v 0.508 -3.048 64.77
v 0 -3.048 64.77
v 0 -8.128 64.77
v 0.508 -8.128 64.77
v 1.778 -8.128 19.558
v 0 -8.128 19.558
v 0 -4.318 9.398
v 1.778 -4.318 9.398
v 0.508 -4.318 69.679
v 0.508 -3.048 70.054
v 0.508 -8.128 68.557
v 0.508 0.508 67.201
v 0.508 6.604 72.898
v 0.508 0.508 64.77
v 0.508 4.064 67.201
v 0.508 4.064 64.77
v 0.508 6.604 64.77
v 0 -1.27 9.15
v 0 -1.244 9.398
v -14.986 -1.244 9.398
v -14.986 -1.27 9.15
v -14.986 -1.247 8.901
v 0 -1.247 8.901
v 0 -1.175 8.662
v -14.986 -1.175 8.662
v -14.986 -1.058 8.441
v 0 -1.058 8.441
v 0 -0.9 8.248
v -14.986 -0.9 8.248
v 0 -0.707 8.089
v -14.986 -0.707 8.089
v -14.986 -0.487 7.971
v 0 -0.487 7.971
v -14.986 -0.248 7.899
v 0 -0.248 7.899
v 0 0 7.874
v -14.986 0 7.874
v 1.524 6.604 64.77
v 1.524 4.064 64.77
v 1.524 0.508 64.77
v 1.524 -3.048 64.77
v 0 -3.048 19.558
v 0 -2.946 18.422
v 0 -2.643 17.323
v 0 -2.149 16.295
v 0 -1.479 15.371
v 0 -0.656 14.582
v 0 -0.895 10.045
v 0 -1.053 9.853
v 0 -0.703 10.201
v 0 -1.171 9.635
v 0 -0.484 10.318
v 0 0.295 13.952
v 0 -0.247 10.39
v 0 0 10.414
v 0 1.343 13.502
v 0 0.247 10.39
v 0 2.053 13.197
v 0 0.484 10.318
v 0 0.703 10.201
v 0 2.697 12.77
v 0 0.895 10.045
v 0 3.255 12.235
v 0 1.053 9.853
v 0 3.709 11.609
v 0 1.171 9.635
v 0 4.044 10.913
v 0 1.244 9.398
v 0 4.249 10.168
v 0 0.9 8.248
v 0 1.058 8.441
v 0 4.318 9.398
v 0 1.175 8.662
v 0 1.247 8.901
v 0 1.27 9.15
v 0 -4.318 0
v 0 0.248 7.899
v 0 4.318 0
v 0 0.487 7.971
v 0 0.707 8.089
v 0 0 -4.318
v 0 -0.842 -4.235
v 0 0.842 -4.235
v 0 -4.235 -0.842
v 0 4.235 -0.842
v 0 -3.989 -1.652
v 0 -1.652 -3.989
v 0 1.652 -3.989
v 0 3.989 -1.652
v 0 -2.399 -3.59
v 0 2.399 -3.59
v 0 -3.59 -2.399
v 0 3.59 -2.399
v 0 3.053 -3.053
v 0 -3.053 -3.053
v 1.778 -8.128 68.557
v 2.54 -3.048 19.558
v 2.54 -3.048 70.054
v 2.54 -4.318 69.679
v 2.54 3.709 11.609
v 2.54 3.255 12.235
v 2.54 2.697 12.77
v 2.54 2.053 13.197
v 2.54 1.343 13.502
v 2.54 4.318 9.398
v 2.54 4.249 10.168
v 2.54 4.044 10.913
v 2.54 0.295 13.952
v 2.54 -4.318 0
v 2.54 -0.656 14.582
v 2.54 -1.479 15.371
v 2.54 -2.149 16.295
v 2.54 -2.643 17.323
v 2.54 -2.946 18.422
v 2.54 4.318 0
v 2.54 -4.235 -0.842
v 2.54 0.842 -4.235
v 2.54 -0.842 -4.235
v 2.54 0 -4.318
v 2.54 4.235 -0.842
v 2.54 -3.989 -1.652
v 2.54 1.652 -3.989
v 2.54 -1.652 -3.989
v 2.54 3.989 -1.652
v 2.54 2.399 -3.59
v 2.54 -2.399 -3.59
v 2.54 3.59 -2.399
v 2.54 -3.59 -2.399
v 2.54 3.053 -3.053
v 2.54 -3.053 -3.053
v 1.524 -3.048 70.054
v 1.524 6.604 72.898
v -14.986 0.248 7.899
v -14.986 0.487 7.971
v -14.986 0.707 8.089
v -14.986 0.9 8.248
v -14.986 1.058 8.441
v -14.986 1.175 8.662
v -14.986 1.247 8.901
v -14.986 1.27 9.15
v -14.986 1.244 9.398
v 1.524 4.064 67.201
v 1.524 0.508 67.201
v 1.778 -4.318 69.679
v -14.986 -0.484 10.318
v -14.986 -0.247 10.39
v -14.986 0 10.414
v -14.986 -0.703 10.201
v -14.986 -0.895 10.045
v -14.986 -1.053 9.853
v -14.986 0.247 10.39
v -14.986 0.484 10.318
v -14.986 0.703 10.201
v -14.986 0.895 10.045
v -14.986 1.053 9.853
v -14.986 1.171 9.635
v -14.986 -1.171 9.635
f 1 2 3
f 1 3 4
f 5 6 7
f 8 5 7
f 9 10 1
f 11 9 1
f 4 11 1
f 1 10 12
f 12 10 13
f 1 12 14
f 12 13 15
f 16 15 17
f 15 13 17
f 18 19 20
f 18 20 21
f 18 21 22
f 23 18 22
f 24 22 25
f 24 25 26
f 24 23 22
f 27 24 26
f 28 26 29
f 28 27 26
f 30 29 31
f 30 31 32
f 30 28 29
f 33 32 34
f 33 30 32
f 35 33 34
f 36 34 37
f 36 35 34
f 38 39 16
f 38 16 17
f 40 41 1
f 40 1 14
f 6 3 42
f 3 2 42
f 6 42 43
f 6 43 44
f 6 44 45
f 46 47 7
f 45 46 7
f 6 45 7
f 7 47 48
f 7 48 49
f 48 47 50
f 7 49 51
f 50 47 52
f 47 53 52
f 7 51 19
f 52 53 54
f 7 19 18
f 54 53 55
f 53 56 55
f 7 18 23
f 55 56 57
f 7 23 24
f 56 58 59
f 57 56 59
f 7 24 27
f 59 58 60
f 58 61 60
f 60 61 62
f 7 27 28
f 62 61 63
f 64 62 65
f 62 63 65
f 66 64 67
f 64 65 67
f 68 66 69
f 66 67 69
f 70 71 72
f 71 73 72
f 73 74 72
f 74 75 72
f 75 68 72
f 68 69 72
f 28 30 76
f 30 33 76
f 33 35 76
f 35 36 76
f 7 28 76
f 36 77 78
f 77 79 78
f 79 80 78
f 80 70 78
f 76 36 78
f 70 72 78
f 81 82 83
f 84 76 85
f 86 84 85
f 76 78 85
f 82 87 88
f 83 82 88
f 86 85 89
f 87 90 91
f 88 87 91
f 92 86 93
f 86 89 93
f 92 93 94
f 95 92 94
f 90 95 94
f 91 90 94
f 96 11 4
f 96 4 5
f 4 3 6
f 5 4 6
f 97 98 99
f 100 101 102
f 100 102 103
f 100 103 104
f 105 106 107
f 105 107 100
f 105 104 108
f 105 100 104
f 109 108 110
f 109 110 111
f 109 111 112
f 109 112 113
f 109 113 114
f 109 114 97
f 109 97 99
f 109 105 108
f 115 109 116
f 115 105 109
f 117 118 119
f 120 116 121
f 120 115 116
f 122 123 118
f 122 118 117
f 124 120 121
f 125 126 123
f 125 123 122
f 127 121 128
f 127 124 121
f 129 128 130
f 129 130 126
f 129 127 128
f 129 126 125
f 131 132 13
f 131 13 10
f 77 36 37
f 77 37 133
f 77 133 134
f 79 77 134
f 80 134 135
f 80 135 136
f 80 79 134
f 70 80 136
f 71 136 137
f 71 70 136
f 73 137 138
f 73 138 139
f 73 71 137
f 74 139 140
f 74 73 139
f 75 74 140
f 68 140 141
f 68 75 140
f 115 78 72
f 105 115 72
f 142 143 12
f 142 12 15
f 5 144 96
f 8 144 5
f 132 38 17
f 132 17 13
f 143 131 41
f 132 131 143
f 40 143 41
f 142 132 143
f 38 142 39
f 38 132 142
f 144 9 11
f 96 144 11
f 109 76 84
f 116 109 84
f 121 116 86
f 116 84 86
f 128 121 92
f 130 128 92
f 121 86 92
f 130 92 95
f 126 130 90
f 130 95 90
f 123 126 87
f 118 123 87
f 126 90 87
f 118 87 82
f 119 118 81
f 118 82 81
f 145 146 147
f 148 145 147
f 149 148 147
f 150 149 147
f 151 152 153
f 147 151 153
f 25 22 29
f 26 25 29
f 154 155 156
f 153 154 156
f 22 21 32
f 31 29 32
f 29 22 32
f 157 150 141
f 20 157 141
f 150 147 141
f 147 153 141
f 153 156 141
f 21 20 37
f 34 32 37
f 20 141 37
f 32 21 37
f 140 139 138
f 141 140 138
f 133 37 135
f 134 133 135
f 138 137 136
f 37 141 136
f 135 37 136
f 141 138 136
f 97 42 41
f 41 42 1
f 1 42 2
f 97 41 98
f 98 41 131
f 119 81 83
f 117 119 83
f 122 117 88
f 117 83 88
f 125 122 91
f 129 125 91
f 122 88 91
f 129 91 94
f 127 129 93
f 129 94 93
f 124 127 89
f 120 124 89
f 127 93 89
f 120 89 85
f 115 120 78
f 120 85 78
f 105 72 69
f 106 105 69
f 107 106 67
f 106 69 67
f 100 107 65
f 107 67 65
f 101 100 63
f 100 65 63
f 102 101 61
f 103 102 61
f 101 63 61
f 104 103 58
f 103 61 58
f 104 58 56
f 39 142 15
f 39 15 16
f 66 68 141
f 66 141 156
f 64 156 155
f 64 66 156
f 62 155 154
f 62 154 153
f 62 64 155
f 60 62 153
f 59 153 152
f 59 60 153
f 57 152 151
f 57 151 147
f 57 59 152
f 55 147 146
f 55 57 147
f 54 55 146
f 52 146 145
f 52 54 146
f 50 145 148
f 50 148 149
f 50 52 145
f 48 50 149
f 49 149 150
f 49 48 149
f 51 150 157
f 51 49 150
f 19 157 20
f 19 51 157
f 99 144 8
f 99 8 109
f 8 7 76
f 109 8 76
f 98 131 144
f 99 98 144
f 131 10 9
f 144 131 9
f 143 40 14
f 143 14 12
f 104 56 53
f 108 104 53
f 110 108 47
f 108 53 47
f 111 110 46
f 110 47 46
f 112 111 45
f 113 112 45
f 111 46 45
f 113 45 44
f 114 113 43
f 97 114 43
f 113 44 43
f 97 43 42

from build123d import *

# Parameters (mm, degrees)
BOSS_EXTRUDE2_DEPTH = 2.54
BOSS_EXTRUDE3_DEPTH = 1.778
BOSS_EXTRUDE4_START = 1.524
BOSS_EXTRUDE4_DEPTH = 1.27
SKETCH1_8_R         = 1.27
BOSS_EXTRUDE5_DEPTH = 14.986
SKETCH2_W           = 0.508
SKETCH2_H           = 8.128
CUT_EXTRUDE1_DEPTH  = 76.866530328


with BuildPart() as part:
    # Sketch1 → Boss-Extrude2 (new body)
    with BuildSketch(Plane(origin=(0, 0, 0), x_dir=(0, 0, -1), z_dir=(1, 0, 0))):
        with BuildLine():
            Line((0, 4.318), (-9.398, 4.318))
            ThreePointArc((-9.398, 4.318), (-11.932525974, 3.495897895), (-13.501957395, 1.342630889))
            ThreePointArc((-13.501957395, 1.342630889), (-15.817903355, -1.834857441), (-19.558, -3.048))
            Line((-19.558, -3.048), (-70.05358602, -3.048))
            Line((-70.05358602, -3.048), (-69.679321023, -4.318))
            Line((-69.679321023, -4.318), (0, -4.318))
            ThreePointArc((0, -4.318), (4.318, 0), (0, 4.318))
        make_face()
    extrude(amount=BOSS_EXTRUDE2_DEPTH)

    # Sketch1<5> → Boss-Extrude3 (add)
    with BuildSketch(Plane(origin=(0, 0, 0), x_dir=(0, 0, -1), z_dir=(1, 0, 0))):
        Polygon((-19.558, -8.128), (-9.398, -4.318), (-69.679321023, -4.318), (-68.55652603, -8.128), align=None)
    extrude(amount=BOSS_EXTRUDE3_DEPTH)

    # Sketch1<7> → Boss-Extrude4 (add)
    with BuildSketch(Plane(origin=(0, 0, 0), x_dir=(0, 0, -1), z_dir=(1, 0, 0)).offset(BOSS_EXTRUDE4_START)):
        Polygon((-70.05358602, -3.048), (-64.77, -3.048), (-64.77, 0.508), (-67.200502007, 0.508), (-67.200502007, 4.064), (-64.77, 4.064), (-64.77, 6.604), (-72.898, 6.604), align=None)
    extrude(amount=-BOSS_EXTRUDE4_DEPTH)

    # Sketch1<8> → Boss-Extrude5 (add)
    with BuildSketch(Plane(origin=(0, 0, 0), x_dir=(0, 0, -1), z_dir=(1, 0, 0))):
        with Locations((-9.144, 0)):
            Circle(SKETCH1_8_R)
    extrude(amount=-BOSS_EXTRUDE5_DEPTH)

    # Sketch2 → Cut-Extrude1 (cut, through all)
    with BuildSketch(Plane(origin=(0, 6.604, 0), x_dir=(1, 0, 0), z_dir=(0, 1, 0))):
        with Locations((0.254, -68.834)):
            Rectangle(SKETCH2_W, SKETCH2_H)
    extrude(amount=-CUT_EXTRUDE1_DEPTH, mode=Mode.SUBTRACT)


solid = part.part
